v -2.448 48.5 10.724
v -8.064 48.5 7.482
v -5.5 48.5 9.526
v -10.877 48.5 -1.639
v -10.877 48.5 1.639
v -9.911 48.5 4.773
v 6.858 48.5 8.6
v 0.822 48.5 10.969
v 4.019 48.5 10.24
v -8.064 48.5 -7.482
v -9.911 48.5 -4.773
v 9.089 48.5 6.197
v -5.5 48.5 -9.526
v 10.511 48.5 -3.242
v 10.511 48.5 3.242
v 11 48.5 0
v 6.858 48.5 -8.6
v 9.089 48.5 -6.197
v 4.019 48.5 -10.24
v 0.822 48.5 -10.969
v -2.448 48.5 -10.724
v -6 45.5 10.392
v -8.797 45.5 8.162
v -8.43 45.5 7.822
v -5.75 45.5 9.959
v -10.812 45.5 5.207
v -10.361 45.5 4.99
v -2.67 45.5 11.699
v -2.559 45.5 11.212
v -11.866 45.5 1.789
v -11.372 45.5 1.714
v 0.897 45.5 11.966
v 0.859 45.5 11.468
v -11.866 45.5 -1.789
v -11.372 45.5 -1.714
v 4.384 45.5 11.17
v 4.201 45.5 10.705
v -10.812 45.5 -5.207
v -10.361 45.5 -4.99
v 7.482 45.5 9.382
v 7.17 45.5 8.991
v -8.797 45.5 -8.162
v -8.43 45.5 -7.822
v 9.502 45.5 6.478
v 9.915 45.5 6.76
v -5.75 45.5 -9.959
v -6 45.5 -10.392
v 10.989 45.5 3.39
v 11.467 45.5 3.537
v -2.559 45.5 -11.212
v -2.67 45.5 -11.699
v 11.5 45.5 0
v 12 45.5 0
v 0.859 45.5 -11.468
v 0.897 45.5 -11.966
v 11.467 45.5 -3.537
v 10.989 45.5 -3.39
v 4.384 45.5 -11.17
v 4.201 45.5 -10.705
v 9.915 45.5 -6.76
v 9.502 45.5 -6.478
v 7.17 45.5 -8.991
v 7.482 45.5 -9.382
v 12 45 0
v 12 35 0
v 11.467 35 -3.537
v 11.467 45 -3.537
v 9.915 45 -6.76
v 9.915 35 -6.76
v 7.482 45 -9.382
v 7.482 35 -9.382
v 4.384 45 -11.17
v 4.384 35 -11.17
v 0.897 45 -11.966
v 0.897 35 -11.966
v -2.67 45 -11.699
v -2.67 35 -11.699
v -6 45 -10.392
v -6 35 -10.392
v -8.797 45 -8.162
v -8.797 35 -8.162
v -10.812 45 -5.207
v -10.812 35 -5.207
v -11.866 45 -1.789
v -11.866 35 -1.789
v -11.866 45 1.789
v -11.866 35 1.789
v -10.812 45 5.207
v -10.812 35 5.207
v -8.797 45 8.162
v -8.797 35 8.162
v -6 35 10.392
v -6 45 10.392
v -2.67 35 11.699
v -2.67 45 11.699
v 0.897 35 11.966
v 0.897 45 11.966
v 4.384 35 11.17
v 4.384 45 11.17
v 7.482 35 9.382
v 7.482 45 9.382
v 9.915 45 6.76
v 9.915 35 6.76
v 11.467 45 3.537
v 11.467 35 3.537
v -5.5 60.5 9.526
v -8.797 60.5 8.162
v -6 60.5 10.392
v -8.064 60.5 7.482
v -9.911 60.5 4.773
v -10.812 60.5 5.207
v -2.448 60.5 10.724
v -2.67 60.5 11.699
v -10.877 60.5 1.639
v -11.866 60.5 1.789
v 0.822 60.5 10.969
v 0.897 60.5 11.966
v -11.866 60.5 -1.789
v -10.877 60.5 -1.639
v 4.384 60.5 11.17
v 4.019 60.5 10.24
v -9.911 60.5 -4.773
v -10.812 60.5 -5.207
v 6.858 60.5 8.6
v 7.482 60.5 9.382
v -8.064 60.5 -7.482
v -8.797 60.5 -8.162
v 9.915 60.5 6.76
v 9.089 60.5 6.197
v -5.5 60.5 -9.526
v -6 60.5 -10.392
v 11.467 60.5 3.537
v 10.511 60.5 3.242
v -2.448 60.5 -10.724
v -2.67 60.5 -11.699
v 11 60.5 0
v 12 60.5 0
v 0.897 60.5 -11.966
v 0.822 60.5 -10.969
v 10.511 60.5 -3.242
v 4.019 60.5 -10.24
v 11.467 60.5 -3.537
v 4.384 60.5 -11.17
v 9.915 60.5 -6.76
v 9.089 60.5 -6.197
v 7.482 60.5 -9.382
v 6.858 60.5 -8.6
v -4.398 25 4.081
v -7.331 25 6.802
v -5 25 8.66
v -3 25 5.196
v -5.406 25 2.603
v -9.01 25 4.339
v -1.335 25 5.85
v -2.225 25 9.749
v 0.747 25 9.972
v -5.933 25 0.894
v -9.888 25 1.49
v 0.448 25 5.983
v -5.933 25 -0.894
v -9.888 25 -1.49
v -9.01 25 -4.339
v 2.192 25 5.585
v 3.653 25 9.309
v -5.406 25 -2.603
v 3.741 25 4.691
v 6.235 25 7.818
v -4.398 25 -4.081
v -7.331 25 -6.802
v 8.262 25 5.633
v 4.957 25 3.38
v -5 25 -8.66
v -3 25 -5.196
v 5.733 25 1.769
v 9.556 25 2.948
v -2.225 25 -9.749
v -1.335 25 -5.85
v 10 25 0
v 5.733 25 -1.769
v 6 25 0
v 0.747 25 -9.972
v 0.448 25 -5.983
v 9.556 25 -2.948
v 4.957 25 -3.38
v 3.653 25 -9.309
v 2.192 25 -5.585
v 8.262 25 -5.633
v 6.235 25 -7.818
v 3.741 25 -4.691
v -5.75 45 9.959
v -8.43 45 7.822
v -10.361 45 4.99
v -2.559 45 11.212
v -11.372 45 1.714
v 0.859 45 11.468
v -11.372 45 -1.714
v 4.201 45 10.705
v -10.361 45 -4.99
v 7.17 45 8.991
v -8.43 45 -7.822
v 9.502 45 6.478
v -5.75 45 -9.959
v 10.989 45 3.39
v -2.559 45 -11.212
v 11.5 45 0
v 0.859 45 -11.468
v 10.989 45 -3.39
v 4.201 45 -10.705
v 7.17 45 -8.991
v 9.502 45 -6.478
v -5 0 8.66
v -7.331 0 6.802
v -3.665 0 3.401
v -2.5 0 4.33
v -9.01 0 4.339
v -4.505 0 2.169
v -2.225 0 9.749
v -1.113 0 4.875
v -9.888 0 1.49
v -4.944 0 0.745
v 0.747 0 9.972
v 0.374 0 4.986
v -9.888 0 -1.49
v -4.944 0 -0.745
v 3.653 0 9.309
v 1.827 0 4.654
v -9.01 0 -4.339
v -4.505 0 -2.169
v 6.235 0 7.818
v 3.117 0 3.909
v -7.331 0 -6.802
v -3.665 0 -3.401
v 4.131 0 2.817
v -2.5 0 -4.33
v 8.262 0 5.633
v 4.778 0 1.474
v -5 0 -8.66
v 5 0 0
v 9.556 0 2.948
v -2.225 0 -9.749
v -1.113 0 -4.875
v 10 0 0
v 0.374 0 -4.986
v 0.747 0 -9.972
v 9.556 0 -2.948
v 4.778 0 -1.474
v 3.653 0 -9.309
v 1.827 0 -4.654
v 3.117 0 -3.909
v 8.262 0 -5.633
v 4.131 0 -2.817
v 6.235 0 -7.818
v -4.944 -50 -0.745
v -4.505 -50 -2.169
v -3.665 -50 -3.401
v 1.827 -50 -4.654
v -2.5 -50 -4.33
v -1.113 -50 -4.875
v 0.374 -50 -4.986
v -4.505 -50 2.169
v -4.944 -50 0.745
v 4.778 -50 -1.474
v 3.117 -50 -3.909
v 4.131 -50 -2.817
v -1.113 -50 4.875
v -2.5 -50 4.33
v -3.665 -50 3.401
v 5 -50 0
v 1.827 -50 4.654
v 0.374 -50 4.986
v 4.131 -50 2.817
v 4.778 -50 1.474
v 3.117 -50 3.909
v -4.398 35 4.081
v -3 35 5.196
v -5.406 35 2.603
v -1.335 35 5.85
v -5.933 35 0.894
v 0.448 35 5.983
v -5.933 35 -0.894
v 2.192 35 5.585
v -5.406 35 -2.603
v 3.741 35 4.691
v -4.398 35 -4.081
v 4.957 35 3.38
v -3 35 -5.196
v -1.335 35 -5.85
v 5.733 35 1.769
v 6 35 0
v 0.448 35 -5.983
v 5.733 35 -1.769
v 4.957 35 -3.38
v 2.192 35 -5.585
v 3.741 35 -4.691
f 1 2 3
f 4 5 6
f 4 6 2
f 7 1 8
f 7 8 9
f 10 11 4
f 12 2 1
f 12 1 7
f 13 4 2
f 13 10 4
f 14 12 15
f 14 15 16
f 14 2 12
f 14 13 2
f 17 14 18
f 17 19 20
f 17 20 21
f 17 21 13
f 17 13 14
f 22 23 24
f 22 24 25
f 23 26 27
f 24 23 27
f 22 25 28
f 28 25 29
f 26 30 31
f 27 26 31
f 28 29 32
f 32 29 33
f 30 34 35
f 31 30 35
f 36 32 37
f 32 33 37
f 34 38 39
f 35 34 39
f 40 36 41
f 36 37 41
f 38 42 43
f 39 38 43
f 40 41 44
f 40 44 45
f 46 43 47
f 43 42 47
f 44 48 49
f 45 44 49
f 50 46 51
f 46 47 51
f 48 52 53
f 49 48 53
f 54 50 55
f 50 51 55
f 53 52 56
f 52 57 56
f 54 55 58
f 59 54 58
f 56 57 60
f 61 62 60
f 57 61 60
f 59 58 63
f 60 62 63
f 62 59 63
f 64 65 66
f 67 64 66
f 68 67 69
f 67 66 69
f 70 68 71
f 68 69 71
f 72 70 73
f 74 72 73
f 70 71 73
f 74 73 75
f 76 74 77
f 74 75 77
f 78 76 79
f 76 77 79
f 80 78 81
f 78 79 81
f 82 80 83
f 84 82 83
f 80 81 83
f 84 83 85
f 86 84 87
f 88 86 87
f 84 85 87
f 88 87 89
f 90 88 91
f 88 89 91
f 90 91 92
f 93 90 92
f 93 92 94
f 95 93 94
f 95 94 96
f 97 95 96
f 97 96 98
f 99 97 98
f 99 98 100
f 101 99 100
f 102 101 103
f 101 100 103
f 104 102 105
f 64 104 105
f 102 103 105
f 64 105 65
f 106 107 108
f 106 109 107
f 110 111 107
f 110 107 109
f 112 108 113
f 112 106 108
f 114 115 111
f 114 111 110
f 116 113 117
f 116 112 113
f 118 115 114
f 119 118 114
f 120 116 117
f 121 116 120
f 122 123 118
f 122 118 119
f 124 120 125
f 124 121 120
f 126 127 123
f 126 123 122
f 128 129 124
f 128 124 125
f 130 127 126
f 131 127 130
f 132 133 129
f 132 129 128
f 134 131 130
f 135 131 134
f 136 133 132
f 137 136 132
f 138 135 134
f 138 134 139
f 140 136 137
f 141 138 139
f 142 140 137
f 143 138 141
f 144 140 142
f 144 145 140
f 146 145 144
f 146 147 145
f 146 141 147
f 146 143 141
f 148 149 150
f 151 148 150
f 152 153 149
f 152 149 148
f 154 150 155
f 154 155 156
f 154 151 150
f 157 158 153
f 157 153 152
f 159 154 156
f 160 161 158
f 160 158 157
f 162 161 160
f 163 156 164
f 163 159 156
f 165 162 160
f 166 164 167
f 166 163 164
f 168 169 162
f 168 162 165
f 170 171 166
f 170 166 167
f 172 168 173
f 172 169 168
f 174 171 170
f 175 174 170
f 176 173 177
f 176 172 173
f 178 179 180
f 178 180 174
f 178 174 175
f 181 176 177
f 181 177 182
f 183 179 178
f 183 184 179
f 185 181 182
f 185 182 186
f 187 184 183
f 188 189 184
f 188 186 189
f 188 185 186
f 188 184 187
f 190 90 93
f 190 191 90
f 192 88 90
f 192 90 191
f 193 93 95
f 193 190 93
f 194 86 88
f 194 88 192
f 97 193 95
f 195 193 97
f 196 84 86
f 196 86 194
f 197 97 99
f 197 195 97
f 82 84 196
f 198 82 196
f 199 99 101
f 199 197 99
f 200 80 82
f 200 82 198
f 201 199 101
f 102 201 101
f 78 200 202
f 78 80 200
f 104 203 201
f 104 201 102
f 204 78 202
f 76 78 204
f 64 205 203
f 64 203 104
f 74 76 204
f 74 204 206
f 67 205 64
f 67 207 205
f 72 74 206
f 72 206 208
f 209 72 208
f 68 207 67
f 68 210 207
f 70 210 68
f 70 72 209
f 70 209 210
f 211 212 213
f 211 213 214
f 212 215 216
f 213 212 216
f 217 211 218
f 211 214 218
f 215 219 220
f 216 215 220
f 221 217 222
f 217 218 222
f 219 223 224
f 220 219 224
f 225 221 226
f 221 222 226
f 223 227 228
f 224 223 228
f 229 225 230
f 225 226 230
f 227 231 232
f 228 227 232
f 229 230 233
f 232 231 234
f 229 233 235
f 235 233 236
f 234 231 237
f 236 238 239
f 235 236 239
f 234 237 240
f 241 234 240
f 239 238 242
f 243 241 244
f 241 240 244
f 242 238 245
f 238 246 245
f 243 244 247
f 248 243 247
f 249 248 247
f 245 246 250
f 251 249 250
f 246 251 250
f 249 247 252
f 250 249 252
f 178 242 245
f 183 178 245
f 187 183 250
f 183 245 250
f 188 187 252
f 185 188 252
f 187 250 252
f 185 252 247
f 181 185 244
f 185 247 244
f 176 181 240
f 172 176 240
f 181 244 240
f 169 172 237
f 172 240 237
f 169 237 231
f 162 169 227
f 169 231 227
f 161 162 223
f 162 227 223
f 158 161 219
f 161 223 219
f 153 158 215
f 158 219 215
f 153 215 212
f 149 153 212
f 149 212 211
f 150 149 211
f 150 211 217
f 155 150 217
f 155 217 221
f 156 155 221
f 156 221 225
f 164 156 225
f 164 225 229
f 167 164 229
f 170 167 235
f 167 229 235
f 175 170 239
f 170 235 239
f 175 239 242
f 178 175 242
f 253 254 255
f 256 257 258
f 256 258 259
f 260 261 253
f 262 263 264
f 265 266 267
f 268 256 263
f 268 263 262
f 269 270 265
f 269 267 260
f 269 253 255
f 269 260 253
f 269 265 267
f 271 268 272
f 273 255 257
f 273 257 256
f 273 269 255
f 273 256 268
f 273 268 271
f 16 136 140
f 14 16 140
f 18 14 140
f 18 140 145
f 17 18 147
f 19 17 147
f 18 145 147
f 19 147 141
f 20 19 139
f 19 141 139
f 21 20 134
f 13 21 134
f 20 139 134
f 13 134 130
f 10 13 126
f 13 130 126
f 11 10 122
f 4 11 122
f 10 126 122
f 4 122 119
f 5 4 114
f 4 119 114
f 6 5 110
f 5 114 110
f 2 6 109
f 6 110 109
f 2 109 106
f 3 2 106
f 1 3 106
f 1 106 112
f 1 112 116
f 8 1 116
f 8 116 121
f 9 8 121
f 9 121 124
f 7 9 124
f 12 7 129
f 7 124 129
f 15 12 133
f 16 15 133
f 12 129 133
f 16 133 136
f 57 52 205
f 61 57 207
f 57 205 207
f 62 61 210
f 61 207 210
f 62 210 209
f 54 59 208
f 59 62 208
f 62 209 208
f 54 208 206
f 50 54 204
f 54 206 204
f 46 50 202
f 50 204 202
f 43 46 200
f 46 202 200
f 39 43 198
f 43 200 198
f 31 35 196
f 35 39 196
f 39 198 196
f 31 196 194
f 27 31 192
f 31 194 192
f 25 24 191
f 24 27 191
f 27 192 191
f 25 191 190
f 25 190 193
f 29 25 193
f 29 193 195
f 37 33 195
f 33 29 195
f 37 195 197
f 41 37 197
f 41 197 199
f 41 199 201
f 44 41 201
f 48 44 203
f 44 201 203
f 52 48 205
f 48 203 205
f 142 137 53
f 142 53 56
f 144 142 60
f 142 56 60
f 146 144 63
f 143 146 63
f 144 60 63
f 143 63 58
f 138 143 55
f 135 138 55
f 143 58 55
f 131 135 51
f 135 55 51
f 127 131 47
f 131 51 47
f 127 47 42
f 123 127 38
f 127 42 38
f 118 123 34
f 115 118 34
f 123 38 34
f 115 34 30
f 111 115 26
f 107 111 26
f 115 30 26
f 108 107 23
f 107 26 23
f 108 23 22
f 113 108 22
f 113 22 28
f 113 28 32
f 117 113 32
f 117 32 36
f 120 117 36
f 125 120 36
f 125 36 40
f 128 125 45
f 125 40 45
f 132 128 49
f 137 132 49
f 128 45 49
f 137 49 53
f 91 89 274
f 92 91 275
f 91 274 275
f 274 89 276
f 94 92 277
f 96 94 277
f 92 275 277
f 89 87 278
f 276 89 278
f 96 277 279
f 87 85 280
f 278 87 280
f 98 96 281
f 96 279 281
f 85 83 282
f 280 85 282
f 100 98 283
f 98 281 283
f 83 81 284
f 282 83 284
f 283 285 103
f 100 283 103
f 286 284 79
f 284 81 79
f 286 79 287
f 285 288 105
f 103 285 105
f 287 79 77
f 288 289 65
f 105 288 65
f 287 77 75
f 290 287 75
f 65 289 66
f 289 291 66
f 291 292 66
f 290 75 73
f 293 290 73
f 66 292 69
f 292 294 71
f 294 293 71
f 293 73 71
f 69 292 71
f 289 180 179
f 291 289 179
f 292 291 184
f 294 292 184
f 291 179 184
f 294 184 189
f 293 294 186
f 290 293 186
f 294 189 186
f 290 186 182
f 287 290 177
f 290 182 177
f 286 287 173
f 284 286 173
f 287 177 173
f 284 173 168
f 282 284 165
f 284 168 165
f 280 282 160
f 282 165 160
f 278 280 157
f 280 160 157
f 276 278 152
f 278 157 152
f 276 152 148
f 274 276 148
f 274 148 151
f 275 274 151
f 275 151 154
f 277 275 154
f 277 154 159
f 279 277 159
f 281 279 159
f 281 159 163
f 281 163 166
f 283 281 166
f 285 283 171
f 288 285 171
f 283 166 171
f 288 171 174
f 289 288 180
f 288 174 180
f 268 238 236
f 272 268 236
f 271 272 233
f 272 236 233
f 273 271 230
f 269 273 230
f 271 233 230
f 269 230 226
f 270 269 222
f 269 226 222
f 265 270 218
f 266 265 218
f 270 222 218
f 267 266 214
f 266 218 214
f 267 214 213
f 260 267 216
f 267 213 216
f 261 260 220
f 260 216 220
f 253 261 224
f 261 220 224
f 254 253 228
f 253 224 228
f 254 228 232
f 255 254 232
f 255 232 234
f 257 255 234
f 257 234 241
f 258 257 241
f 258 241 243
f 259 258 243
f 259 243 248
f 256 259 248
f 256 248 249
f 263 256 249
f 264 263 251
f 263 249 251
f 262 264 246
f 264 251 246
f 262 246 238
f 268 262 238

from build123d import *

# Parameters (mm, degrees)
SKETCH_1_R          = 10
EXTRUDE_1_DEPTH     = 25
SKETCH_2_R          = 5
EXTRUDE_2_DEPTH     = 50
SKETCH_3_R          = 6
EXTRUDE_3_DEPTH     = 10
SKETCH_4_R          = 12
EXTRUDE_4_DEPTH     = 10
EXTRUDE_START       = 0.5
SKETCH_5_R          = 12
EXTRUDE_5_DEPTH     = 15
SKETCH_6_R          = 11.5
EXTRUDE_6_DEPTH     = 1
SKETCH_7_R          = 11
CUT_EXTRUDE_1_DEPTH = 12


with BuildPart() as part:
    # 草图1 → 凸台-拉伸1 (new body)
    with BuildSketch(Plane(origin=(0, 0, 0), x_dir=(1, 0, 0), z_dir=(0, 1, 0))):
        Circle(SKETCH_1_R)
    extrude(amount=EXTRUDE_1_DEPTH)

    # 草图2 → 凸台-拉伸2 (add)
    with BuildSketch(Plane.XZ):
        Circle(SKETCH_2_R)
    extrude(amount=EXTRUDE_2_DEPTH)

    # 草图3 → 凸台-拉伸3 (add)
    with BuildSketch(Plane(origin=(0, 25, 0), x_dir=(1, 0, 0), z_dir=(0, 1, 0))):
        Circle(SKETCH_3_R)
    extrude(amount=EXTRUDE_3_DEPTH)

    # 草图4 → 凸台-拉伸4 (add)
    with BuildSketch(Plane(origin=(0, 35, 0), x_dir=(1, 0, 0), z_dir=(0, 1, 0))):
        Circle(SKETCH_4_R)
    extrude(amount=EXTRUDE_4_DEPTH)



with BuildPart() as body_2:
    # 草图5 → 凸台-拉伸5 (new body)
    with BuildSketch(Plane(origin=(0, 45, 0), x_dir=(1, 0, 0), z_dir=(0, 1, 0)).offset(EXTRUDE_START)):
        Circle(SKETCH_5_R)
    extrude(amount=EXTRUDE_5_DEPTH)


with BuildPart() as part_1:
    add(part.part)

    add(body_2.part)  # 凸台-拉伸6 merges body 2
    # 草图6 → 凸台-拉伸6 (add)
    with BuildSketch(Plane(origin=(0, 45, 0), x_dir=(1, 0, 0), z_dir=(0, 1, 0))):
        Circle(SKETCH_6_R)
    extrude(amount=EXTRUDE_6_DEPTH)

    # 草图7 → 切除-拉伸1 (cut)
    with BuildSketch(Plane(origin=(0, 60.5, 0), x_dir=(1, 0, 0), z_dir=(0, 1, 0))):
        Circle(SKETCH_7_R)
    extrude(amount=-CUT_EXTRUDE_1_DEPTH, mode=Mode.SUBTRACT)


solid = part_1.part
